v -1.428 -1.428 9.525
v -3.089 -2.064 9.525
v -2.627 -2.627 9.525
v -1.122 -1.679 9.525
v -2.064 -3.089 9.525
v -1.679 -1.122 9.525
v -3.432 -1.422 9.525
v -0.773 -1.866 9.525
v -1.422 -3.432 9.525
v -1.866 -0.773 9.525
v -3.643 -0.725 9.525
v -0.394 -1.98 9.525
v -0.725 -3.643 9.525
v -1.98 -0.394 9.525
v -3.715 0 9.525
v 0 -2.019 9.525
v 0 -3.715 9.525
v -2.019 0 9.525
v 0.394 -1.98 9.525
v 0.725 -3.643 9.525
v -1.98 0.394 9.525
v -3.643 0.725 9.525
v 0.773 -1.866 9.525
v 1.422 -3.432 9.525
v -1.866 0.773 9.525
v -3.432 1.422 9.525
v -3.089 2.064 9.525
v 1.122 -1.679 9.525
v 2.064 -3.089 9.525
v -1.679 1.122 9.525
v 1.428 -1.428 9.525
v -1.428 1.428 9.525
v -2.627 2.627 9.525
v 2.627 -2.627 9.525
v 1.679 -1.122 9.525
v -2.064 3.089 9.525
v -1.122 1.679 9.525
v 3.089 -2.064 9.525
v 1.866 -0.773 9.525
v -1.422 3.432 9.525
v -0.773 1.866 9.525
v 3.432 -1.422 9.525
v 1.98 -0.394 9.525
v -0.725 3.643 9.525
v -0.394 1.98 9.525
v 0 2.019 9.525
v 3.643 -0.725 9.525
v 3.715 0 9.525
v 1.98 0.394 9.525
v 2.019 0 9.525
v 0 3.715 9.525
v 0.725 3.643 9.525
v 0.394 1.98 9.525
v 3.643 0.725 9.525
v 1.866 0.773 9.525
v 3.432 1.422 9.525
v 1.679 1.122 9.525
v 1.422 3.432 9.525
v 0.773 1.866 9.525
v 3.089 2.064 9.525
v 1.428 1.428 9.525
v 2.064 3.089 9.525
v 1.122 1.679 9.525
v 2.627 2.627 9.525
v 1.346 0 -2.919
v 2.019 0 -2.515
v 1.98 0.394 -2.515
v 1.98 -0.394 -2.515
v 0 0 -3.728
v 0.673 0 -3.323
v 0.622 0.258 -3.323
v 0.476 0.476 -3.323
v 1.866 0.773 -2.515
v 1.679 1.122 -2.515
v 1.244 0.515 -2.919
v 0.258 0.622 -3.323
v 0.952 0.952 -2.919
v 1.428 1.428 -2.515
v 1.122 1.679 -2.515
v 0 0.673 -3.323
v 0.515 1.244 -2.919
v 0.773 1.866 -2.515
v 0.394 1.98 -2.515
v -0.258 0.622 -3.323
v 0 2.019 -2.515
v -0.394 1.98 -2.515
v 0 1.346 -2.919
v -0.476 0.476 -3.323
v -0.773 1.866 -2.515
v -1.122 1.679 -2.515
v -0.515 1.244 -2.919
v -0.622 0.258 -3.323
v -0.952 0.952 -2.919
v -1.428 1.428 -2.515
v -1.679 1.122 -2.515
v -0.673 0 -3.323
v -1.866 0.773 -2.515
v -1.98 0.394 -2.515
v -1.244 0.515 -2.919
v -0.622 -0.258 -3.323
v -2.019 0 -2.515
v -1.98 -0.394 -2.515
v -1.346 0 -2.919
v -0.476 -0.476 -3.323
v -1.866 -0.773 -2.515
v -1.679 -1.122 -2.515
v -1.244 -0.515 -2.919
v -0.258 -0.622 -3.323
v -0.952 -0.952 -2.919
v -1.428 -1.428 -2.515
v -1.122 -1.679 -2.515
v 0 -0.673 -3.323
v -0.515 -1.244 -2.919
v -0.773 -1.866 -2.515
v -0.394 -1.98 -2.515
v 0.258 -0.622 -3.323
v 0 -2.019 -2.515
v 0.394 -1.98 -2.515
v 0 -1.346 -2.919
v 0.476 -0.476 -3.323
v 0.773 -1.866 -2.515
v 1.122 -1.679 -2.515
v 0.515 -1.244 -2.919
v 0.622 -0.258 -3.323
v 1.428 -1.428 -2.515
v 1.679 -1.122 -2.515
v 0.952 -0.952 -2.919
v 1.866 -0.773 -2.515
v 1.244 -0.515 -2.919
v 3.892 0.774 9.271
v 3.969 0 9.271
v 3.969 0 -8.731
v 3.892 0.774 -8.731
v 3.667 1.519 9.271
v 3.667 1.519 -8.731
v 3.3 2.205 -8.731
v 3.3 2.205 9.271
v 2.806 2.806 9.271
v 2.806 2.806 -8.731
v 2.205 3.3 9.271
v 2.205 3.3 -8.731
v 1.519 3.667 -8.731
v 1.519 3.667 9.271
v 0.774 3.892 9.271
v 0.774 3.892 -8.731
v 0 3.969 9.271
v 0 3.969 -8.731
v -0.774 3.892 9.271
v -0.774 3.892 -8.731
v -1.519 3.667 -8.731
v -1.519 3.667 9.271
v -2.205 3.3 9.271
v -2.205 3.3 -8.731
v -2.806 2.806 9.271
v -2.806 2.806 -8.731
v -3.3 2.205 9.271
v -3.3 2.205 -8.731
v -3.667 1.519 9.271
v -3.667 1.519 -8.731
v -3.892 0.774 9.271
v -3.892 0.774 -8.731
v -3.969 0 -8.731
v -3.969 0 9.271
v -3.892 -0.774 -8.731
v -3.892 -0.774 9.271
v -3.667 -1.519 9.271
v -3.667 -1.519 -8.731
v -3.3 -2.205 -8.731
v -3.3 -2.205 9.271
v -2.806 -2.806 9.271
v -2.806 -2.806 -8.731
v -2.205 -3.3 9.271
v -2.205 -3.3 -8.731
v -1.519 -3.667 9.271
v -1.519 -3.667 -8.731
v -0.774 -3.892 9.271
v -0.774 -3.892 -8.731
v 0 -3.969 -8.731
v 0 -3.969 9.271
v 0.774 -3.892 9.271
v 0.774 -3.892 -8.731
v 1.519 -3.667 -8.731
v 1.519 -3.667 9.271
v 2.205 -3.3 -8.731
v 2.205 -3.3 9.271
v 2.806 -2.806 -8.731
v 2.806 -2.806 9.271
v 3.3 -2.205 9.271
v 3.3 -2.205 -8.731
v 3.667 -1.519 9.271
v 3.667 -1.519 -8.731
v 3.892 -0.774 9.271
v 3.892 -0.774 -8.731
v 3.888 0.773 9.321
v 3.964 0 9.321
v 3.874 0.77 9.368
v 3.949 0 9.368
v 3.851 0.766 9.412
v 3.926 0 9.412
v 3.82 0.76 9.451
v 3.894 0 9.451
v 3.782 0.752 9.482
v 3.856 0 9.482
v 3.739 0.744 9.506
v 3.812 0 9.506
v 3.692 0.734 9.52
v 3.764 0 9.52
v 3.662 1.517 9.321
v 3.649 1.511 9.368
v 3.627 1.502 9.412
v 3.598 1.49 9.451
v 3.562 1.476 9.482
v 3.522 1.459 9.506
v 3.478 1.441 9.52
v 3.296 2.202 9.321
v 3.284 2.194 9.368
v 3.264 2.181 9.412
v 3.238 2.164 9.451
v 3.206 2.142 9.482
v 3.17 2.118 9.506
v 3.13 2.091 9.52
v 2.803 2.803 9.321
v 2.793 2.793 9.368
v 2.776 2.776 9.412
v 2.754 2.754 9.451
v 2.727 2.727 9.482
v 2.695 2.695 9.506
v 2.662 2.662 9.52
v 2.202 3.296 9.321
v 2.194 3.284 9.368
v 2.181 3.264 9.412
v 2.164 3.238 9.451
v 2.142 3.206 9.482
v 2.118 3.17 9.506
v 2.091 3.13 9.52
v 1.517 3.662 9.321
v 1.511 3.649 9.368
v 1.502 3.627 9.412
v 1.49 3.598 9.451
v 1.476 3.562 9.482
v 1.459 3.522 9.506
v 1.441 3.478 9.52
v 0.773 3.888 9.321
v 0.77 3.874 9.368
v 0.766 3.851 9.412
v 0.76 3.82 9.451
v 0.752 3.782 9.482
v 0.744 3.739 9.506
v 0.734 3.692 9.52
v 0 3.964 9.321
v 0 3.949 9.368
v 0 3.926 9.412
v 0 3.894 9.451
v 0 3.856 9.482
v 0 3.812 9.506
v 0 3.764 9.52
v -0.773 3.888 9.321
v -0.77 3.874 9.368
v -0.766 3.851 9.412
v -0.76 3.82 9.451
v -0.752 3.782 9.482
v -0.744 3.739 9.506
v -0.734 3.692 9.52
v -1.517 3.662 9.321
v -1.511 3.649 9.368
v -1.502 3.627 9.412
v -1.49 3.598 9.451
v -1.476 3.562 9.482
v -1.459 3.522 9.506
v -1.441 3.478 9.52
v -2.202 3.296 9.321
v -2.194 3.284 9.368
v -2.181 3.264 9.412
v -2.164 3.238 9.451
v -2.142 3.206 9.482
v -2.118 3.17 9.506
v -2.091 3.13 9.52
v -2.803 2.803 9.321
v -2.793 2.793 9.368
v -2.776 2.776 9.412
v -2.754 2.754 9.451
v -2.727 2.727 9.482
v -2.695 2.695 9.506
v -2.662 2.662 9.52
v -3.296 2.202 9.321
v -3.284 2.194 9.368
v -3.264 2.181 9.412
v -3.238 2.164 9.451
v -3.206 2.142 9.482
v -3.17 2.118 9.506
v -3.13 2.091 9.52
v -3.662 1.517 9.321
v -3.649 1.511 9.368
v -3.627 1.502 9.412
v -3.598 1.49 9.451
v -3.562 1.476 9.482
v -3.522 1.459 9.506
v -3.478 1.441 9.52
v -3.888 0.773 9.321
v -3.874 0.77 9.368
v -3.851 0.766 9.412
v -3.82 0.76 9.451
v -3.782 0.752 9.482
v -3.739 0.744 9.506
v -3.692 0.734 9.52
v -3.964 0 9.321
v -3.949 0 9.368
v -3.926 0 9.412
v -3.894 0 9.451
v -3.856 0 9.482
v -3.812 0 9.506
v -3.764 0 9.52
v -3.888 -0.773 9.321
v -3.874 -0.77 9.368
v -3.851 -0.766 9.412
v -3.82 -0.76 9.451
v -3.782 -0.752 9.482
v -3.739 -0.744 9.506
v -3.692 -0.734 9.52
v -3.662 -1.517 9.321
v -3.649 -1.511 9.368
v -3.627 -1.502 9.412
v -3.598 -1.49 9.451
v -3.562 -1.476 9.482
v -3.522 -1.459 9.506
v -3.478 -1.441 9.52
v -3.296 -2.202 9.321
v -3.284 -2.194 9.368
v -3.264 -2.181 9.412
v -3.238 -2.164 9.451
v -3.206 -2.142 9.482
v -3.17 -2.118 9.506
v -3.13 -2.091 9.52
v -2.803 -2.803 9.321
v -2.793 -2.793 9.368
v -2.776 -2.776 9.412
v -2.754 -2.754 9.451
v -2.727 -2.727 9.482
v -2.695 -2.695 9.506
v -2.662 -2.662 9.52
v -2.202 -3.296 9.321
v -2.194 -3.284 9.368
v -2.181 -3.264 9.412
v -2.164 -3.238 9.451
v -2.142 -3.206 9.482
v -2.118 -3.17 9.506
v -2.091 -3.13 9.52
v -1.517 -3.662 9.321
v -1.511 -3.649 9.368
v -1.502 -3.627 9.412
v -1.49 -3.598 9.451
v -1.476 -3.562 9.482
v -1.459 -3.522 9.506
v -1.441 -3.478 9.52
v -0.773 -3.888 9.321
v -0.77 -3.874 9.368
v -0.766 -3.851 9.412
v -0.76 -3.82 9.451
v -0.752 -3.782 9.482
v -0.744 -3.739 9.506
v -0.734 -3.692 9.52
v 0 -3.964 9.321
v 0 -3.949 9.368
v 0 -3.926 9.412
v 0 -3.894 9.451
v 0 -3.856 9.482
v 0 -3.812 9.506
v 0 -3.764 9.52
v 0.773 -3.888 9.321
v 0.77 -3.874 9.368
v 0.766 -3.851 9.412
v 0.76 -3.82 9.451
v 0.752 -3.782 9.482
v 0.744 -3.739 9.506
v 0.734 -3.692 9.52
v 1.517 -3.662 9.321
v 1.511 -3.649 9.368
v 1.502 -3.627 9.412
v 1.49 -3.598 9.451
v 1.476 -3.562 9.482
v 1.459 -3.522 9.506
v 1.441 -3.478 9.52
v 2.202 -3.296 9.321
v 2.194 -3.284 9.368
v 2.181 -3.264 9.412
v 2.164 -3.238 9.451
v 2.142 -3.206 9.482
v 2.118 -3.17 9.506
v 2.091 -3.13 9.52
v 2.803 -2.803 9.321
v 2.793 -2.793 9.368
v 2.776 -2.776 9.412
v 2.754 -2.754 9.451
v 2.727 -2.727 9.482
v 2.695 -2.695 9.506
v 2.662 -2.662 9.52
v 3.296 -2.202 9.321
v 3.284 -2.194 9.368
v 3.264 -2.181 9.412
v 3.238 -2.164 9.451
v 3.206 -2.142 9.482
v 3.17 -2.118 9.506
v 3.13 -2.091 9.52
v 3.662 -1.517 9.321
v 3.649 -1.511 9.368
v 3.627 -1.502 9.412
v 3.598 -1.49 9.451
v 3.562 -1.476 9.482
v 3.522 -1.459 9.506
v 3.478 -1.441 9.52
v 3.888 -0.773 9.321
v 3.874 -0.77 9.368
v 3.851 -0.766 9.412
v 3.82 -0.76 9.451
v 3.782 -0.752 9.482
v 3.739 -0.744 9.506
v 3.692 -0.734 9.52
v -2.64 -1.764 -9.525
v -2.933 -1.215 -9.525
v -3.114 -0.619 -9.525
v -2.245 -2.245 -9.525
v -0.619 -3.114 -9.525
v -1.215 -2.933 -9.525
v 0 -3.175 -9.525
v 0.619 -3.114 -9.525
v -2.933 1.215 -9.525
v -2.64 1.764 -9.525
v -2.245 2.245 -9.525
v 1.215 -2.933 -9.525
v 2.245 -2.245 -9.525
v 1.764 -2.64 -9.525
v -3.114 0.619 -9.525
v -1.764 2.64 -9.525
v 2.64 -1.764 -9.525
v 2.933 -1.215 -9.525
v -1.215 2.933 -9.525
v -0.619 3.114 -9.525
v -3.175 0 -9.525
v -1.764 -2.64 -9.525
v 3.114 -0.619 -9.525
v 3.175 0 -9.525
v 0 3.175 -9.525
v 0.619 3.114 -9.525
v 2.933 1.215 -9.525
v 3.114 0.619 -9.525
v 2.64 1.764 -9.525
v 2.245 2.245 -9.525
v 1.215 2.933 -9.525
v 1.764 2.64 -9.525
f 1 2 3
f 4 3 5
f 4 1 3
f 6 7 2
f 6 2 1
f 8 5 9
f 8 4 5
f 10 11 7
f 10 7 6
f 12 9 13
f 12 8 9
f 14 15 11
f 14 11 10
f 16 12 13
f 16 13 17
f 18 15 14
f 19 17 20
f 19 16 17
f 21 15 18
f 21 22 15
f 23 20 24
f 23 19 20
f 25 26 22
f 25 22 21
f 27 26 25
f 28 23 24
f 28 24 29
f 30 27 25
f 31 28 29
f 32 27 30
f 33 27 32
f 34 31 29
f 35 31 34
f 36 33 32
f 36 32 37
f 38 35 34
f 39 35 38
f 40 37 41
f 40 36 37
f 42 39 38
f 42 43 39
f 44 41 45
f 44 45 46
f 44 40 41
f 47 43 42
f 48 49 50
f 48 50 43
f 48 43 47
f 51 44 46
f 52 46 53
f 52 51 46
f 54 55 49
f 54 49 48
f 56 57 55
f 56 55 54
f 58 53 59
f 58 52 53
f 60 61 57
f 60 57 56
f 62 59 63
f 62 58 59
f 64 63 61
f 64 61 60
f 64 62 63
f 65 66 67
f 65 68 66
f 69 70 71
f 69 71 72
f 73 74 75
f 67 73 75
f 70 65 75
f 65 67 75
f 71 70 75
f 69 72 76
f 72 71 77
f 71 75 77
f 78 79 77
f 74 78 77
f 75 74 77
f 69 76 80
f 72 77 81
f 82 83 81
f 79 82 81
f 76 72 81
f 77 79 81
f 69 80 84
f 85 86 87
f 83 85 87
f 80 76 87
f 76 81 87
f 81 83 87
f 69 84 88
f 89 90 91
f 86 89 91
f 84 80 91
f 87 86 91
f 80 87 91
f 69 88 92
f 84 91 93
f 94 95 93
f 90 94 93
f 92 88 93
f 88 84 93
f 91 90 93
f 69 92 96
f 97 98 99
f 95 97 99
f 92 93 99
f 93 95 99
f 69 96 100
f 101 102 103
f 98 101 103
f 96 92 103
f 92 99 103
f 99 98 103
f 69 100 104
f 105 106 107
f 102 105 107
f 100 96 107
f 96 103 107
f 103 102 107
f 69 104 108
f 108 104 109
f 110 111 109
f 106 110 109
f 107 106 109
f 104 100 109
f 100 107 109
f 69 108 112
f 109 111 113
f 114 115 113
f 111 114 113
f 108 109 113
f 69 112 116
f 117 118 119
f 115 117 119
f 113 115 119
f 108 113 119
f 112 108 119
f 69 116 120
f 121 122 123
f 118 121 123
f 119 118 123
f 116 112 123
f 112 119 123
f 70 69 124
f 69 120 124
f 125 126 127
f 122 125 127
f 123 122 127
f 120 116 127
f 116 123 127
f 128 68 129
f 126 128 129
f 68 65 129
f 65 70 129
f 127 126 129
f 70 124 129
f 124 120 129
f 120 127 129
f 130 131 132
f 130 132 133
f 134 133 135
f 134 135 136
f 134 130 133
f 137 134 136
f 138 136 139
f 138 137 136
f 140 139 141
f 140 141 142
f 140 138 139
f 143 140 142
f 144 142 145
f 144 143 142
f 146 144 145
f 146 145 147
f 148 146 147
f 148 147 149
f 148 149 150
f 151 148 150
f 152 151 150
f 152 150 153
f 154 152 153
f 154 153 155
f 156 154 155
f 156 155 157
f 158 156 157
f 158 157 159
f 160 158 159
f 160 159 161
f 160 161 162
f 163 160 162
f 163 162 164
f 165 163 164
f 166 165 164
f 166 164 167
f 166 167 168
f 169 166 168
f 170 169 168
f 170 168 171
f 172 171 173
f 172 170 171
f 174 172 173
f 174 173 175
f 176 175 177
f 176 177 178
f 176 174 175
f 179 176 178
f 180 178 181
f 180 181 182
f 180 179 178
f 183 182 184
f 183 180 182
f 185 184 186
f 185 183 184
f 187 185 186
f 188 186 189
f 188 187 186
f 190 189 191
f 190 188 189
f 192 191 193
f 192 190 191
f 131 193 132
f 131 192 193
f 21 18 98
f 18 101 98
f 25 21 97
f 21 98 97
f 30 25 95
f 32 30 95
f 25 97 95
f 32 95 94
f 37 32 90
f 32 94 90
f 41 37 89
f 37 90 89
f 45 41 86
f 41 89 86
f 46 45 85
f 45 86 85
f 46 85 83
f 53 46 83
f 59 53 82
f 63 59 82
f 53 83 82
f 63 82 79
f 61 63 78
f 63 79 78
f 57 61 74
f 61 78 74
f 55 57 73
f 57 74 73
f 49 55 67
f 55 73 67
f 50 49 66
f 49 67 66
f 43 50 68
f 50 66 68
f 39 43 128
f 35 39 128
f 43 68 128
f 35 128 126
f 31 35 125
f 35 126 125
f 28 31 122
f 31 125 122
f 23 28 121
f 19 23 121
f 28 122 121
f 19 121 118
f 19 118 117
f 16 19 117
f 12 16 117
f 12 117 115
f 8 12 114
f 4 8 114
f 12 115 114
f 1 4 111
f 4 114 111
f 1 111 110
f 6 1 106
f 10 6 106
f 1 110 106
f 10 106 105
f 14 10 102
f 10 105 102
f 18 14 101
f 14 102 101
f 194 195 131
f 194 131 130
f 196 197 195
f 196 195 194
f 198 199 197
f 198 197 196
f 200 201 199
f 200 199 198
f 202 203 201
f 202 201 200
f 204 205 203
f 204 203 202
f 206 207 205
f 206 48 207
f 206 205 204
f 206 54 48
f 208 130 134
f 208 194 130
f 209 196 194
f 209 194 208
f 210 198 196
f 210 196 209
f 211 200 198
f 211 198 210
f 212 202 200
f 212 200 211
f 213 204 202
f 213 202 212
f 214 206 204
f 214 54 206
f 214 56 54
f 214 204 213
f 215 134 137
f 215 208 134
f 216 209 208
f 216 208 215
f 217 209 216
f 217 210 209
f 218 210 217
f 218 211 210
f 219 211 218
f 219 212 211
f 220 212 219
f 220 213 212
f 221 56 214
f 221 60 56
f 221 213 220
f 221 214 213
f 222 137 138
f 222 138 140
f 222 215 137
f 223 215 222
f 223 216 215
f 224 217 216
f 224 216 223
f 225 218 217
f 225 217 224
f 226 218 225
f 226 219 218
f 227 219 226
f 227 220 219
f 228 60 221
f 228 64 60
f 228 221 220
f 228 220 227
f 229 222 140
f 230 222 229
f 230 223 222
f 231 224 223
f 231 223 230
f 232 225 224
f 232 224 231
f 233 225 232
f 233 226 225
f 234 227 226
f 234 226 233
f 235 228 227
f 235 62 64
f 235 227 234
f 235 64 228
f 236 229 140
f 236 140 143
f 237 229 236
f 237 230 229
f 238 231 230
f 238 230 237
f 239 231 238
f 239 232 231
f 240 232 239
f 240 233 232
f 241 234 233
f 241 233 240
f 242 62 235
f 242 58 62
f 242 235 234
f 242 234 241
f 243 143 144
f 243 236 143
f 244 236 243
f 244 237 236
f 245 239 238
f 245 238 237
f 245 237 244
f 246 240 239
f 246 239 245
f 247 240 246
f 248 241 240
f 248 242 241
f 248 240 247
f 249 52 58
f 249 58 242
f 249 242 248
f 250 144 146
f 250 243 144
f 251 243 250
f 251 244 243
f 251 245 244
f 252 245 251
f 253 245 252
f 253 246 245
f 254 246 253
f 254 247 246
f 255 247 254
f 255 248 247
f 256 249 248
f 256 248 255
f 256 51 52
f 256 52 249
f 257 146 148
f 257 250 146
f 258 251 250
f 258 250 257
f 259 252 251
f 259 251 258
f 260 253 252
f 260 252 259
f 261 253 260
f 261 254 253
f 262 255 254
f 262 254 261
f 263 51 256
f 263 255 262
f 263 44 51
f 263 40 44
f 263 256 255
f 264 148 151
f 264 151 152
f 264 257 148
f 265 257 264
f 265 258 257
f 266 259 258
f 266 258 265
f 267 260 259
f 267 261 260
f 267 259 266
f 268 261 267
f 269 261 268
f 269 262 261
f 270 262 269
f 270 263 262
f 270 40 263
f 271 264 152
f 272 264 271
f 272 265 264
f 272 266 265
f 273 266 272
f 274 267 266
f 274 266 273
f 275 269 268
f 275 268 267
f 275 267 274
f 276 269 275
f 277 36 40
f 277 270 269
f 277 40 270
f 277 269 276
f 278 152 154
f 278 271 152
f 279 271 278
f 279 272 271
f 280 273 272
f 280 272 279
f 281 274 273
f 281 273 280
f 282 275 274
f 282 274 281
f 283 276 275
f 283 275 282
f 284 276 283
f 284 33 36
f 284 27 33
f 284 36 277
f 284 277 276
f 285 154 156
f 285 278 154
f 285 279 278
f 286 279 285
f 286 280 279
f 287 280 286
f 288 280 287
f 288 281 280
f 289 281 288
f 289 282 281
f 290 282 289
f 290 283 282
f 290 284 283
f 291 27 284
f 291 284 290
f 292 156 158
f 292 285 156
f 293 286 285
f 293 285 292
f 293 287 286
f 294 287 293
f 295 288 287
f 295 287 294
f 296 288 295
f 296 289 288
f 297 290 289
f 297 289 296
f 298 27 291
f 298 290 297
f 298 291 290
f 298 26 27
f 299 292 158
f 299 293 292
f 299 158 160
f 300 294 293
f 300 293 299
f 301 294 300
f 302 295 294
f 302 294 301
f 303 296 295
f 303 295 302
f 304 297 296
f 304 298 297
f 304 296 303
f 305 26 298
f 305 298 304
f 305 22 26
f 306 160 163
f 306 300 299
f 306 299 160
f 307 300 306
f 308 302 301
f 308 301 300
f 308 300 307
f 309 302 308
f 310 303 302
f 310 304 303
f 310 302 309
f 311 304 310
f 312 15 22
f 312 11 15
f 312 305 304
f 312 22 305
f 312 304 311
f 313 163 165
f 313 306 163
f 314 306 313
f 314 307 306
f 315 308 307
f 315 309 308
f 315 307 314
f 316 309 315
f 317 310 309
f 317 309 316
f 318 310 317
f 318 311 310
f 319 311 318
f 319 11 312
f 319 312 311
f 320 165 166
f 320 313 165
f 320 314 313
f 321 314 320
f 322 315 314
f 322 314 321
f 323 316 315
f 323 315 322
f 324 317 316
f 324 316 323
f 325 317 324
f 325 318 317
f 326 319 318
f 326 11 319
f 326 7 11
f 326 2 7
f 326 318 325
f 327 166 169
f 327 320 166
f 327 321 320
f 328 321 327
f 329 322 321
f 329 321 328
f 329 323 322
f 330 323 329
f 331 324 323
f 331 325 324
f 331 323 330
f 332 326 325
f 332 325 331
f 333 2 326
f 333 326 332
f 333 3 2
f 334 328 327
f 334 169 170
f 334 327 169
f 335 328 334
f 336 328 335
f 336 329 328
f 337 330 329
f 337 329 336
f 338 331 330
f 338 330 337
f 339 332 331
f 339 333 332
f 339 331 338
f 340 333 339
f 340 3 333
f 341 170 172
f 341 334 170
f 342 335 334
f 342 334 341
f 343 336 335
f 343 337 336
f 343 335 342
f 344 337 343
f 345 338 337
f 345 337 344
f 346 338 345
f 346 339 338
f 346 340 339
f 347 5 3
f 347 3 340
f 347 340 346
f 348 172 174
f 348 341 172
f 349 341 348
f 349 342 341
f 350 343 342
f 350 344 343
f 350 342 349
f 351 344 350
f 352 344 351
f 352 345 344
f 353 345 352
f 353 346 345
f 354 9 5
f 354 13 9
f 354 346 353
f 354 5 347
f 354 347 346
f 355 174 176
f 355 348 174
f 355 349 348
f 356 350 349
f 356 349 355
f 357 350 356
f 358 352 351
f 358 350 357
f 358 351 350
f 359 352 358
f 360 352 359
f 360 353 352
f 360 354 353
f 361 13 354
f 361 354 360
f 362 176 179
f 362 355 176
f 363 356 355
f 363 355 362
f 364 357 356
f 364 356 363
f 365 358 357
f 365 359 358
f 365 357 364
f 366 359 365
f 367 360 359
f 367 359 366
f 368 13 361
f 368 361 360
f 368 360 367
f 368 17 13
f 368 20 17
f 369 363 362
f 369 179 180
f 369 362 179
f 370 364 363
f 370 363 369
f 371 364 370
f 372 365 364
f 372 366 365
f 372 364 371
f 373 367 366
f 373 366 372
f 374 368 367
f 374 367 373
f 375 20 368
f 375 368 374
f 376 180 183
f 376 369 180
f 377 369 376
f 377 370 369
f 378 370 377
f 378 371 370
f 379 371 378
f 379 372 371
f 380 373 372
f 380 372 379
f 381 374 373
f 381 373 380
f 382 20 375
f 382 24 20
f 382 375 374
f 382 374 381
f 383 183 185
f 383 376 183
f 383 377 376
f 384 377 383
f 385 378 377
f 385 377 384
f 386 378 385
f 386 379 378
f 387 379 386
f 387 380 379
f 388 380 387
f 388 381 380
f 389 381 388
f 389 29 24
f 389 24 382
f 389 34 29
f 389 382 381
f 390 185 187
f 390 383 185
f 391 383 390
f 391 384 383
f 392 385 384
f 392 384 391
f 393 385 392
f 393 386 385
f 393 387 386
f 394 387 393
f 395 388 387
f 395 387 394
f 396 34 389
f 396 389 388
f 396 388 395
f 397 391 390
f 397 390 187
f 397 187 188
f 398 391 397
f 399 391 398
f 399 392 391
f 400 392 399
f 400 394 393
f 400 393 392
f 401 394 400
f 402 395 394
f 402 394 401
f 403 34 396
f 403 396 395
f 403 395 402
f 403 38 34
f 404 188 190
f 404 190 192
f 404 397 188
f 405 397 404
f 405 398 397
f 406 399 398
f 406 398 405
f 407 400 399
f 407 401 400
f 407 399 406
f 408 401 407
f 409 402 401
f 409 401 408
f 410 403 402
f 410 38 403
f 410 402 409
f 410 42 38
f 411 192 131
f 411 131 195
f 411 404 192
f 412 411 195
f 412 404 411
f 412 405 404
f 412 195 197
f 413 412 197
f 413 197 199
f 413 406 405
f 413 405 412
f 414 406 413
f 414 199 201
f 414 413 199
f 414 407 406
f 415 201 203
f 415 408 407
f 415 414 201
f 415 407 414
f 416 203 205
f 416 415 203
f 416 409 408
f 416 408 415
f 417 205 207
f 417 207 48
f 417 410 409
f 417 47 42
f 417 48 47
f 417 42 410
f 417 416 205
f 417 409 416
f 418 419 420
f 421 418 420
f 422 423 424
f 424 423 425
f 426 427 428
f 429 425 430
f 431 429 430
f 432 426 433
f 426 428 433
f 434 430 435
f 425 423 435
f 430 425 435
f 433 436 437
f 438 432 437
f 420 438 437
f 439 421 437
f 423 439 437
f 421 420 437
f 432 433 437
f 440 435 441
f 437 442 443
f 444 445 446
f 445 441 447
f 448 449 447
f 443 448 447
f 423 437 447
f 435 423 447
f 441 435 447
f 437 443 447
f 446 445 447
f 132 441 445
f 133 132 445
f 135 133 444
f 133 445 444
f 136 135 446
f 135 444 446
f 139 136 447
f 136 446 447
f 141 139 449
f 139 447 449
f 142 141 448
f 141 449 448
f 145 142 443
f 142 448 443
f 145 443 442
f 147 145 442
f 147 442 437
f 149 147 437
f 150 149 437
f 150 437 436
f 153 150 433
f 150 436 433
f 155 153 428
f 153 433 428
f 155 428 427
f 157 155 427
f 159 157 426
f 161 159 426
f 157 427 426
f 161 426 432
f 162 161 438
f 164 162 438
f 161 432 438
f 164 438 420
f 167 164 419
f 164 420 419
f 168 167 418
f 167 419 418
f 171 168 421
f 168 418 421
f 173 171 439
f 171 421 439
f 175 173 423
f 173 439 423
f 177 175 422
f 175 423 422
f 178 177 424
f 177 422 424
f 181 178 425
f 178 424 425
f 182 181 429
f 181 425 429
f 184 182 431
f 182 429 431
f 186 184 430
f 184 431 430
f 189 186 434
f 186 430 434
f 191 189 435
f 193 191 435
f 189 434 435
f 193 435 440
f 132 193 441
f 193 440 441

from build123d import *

# Parameters (mm, degrees)
SKETCH1_R                  = 3.96875
EXTRUDE1_DEPTH             = 9.525
FILLET1_R                  = 0.254
CHAMFER1_SIZE              = 0.79375
F_10_32_TAPPED_HOLE1_D     = 4.0386
F_10_32_TAPPED_HOLE1_DEPTH = 12.0396
F_10_32_TAPPED_HOLE1_TIP   = 1.213317848


with BuildPart() as part:
    # Sketch1 → Extrude1 (new body, symmetric)
    with BuildSketch(Plane.XY):
        Circle(SKETCH1_R)
    extrude(amount=EXTRUDE1_DEPTH, both=True)

    # Fillet1
    fillet1_edges = [part.edges().sort_by_distance(p)[0] for p in [
        (-3.96875, 0, 9.525),
    ]]
    fillet(fillet1_edges, radius=FILLET1_R)

    # Chamfer1
    chamfer1_edges = [part.edges().sort_by_distance(p)[0] for p in [
        (-3.96875, 0, -9.525),
    ]]
    chamfer(chamfer1_edges, length=CHAMFER1_SIZE)

    # #10-32 Tapped Hole1
    with Locations(Plane.XY.offset(9.525)):
        with Locations((0, 0)):
            Hole(F_10_32_TAPPED_HOLE1_D / 2, depth=F_10_32_TAPPED_HOLE1_DEPTH)
            with Locations((0, 0, -(F_10_32_TAPPED_HOLE1_DEPTH + F_10_32_TAPPED_HOLE1_TIP / 2))):  # 118° drill point
                Cone(0, F_10_32_TAPPED_HOLE1_D / 2, F_10_32_TAPPED_HOLE1_TIP, mode=Mode.SUBTRACT)


solid = part.part
